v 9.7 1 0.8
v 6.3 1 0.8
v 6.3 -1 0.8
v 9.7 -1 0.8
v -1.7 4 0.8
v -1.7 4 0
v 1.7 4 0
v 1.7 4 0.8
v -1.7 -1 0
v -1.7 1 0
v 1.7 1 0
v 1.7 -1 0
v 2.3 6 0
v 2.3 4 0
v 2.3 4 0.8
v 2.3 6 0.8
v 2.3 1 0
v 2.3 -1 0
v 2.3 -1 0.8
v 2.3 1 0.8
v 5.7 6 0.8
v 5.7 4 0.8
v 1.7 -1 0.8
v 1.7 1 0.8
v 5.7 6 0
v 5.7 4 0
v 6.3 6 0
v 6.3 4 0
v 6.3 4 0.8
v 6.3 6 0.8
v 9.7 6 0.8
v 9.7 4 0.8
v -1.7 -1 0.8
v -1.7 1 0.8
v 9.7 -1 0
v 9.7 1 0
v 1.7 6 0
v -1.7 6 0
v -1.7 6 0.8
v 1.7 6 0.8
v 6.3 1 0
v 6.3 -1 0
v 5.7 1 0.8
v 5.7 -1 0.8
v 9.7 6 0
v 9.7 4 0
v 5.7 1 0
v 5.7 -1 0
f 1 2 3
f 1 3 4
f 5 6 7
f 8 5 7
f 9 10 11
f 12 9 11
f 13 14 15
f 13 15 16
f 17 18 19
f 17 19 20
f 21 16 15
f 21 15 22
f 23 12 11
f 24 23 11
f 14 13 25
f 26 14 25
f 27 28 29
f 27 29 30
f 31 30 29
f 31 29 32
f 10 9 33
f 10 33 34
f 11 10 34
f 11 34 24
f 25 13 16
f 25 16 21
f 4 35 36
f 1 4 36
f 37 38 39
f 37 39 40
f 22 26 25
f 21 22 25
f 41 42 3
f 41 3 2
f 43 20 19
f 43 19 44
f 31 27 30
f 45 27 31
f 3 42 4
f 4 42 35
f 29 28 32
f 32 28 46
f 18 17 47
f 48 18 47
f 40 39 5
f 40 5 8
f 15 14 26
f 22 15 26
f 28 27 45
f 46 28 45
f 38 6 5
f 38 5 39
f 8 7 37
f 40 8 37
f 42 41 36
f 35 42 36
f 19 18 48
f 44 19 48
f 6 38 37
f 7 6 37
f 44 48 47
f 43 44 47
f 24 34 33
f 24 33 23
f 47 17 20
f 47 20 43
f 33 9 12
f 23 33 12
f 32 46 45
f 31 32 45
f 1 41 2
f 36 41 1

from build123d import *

# Parameters (mm, degrees)
SKETCH_1_W        = 3.4
SKETCH_1_H        = 2
EXTRUDE_1_DEPTH   = 0.8
EXTRUDE_1_2_DEPTH = 0.8
EXTRUDE_1_3_DEPTH = 0.8
EXTRUDE_1_4_DEPTH = 0.8
EXTRUDE_1_5_DEPTH = 0.8
EXTRUDE_1_6_DEPTH = 0.8


with BuildPart() as part:
    # Эскиз1 → Бобышка-Вытянуть1 (new body)
    with BuildSketch(Plane.XY):
        with Locations((4, 0)):
            Rectangle(SKETCH_1_W, SKETCH_1_H)
    extrude(amount=EXTRUDE_1_DEPTH)


with BuildPart() as body_2:
    # Эскиз1 → Extrude 1 2 (new body)
    with BuildSketch(Plane.XY):
        Rectangle(SKETCH_1_W, SKETCH_1_H)
    extrude(amount=EXTRUDE_1_2_DEPTH)


with BuildPart() as body_3:
    # Эскиз1 → Extrude 1 3 (new body)
    with BuildSketch(Plane.XY):
        with Locations((8, 0)):
            Rectangle(SKETCH_1_W, SKETCH_1_H)
    extrude(amount=EXTRUDE_1_3_DEPTH)


with BuildPart() as body_4:
    # Эскиз1 → Extrude 1 4 (new body)
    with BuildSketch(Plane.XY):
        with Locations((4, 5)):
            Rectangle(SKETCH_1_W, SKETCH_1_H)
    extrude(amount=EXTRUDE_1_4_DEPTH)


with BuildPart() as body_5:
    # Эскиз1 → Extrude 1 5 (new body)
    with BuildSketch(Plane.XY):
        with Locations((8, 5)):
            Rectangle(SKETCH_1_W, SKETCH_1_H)
    extrude(amount=EXTRUDE_1_5_DEPTH)


with BuildPart() as body_6:
    # Эскиз1 → Extrude 1 6 (new body)
    with BuildSketch(Plane.XY):
        with Locations((0, 5)):
            Rectangle(SKETCH_1_W, SKETCH_1_H)
    extrude(amount=EXTRUDE_1_6_DEPTH)


solid = Compound([part.part, body_2.part, body_3.part, body_4.part, body_5.part, body_6.part])
